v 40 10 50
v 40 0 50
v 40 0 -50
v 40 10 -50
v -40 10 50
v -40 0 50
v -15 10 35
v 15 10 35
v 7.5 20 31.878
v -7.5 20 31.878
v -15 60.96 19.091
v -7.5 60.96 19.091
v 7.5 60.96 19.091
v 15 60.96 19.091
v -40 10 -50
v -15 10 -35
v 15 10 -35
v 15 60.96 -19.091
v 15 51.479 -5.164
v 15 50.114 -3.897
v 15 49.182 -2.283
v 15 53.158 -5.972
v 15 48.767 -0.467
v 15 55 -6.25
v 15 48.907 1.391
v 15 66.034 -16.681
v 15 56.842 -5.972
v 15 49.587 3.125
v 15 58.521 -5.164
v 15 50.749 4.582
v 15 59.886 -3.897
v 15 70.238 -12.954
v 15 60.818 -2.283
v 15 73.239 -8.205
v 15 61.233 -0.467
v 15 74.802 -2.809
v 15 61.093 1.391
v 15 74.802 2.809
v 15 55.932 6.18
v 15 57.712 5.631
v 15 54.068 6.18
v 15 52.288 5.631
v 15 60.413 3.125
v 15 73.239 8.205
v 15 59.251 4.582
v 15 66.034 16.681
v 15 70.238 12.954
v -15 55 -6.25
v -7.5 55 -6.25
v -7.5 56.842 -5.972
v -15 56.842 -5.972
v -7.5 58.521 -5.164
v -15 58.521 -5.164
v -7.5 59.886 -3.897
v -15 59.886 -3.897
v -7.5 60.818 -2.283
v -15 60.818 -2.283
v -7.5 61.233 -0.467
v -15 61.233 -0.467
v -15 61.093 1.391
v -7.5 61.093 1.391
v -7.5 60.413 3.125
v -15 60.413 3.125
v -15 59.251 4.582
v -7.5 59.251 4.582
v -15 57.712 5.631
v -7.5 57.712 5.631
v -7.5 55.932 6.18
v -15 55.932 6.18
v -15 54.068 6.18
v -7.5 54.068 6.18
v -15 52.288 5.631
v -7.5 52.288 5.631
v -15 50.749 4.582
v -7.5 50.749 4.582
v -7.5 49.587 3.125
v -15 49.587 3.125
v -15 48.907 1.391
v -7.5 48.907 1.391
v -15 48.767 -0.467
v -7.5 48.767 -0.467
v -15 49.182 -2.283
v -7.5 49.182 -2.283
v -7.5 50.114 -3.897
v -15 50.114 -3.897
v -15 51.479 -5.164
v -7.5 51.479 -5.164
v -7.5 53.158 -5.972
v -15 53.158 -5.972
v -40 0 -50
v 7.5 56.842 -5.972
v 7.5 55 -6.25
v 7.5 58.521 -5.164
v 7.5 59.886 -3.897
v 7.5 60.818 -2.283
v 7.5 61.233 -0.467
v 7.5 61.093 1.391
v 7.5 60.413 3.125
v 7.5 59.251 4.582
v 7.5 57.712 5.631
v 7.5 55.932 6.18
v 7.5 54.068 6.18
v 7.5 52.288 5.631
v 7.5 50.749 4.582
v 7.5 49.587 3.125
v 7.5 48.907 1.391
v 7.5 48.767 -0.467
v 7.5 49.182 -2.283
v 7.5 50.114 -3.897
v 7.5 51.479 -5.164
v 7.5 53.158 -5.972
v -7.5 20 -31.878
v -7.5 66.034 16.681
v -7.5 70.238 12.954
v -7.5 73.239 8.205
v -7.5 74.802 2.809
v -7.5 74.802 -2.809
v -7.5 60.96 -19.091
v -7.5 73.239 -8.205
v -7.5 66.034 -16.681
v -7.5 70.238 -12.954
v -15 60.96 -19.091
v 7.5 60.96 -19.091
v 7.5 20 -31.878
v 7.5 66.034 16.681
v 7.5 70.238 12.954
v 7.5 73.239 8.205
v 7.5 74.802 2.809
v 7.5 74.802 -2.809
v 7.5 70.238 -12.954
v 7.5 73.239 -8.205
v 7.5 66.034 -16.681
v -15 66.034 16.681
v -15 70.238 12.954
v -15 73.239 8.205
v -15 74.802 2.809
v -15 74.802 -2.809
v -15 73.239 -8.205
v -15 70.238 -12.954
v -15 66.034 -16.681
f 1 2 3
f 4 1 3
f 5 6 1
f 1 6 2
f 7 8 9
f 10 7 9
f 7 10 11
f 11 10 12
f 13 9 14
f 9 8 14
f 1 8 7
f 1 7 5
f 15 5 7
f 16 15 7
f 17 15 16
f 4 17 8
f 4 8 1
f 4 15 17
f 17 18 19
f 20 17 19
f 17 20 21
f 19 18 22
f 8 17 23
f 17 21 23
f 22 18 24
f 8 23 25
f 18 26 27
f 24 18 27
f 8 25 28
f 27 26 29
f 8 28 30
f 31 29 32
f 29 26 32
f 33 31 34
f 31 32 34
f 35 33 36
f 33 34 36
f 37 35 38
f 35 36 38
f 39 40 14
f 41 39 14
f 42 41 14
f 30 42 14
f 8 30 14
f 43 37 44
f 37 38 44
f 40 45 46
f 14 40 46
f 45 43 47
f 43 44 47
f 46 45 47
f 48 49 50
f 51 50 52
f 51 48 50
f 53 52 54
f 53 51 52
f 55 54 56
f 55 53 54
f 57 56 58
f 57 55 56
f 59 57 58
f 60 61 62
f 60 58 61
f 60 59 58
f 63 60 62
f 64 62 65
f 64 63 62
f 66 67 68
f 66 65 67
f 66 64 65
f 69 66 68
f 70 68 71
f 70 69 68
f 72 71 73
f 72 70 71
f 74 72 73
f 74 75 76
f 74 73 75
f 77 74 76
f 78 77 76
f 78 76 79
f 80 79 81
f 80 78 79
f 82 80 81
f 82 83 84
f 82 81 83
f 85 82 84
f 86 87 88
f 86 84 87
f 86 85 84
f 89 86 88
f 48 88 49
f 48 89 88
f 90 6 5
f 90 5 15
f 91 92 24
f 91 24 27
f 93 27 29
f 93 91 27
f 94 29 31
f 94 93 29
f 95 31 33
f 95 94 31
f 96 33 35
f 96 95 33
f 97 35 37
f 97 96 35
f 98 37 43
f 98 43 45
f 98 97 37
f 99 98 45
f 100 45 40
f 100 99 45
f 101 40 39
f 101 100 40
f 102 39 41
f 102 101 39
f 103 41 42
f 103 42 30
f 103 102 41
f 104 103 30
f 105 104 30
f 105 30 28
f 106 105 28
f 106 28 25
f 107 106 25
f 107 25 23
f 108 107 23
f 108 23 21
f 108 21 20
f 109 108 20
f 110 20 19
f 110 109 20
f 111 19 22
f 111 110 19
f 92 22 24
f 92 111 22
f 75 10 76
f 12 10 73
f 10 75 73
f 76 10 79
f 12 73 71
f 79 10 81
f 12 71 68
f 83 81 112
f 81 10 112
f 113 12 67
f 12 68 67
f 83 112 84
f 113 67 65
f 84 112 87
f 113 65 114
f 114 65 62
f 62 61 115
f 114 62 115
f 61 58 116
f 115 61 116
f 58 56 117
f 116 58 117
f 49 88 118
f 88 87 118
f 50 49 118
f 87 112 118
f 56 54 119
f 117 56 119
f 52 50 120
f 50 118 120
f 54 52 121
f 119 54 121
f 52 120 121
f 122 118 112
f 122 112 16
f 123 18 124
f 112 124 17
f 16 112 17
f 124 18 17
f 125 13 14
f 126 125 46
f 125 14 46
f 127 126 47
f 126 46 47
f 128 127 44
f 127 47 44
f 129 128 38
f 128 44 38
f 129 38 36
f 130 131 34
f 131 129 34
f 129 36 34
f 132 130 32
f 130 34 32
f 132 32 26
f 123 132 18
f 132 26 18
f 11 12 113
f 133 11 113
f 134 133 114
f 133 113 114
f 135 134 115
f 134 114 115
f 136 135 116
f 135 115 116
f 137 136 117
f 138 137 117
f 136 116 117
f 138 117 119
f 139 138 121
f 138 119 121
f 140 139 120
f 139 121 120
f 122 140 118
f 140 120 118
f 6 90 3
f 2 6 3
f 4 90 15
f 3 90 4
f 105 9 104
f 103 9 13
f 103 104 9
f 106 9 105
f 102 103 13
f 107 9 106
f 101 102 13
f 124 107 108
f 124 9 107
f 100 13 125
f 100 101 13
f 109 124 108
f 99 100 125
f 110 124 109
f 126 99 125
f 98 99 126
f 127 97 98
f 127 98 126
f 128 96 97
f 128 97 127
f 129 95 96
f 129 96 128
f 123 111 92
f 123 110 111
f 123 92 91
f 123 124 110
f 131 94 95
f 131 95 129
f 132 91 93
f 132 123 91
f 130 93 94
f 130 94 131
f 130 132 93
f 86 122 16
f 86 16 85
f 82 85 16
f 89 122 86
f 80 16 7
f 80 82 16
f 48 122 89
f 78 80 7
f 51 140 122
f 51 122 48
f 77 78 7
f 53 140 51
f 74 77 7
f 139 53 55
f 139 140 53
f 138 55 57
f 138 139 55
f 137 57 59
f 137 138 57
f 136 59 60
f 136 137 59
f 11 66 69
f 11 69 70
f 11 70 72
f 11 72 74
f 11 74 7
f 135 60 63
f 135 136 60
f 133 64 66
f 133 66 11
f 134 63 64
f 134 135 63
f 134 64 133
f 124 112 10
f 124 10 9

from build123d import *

# Parameters (mm, degrees)
SKETCH1_W               = 80
SKETCH1_H               = 100
BOSS_EXTRUDE1_DEPTH     = 10
SKETCH2_R               = 6.25
BOSS_EXTRUDE2_DEPTH     = 15
CUT_EXTRUDE1_DEPTH      = 99.615414617
CUT_EXTRUDE1_DEPTH_BACK = 99.615414617
SKETCH3_W               = 15
SKETCH3_H               = 55


with BuildPart() as part:
    # Sketch1 → Boss-Extrude1 (new body)
    with BuildSketch(Plane(origin=(0, 0, 0), x_dir=(1, 0, 0), z_dir=(0, 1, 0))):
        Rectangle(SKETCH1_W, SKETCH1_H)
    extrude(amount=BOSS_EXTRUDE1_DEPTH)

    # Sketch2 → Boss-Extrude2 (add, symmetric)
    with BuildSketch(Plane(origin=(0, 0, 0), x_dir=(0, 0, -1), z_dir=(1, 0, 0))):
        with BuildLine():
            Line((-35, 10), (-19.091339118, 60.959930425))
            ThreePointArc((-19.091339118, 60.959930425), (0, 75), (19.091339118, 60.959930425))
            Line((19.091339118, 60.959930425), (35, 10))
            Line((35, 10), (-35, 10))
        make_face()
        with Locations((0, 55)):
            Circle(SKETCH2_R, mode=Mode.SUBTRACT)
    extrude(amount=BOSS_EXTRUDE2_DEPTH, both=True)

    # Sketch3 → Cut-Extrude1 (cut, two sides: drawn at the far end of the back side and taken through both)
    with BuildSketch(Plane.XY.offset(-CUT_EXTRUDE1_DEPTH_BACK)):
        with Locations((0, 47.5)):
            Rectangle(SKETCH3_W, SKETCH3_H)
    extrude(amount=CUT_EXTRUDE1_DEPTH + CUT_EXTRUDE1_DEPTH_BACK, mode=Mode.SUBTRACT)


solid = part.part
